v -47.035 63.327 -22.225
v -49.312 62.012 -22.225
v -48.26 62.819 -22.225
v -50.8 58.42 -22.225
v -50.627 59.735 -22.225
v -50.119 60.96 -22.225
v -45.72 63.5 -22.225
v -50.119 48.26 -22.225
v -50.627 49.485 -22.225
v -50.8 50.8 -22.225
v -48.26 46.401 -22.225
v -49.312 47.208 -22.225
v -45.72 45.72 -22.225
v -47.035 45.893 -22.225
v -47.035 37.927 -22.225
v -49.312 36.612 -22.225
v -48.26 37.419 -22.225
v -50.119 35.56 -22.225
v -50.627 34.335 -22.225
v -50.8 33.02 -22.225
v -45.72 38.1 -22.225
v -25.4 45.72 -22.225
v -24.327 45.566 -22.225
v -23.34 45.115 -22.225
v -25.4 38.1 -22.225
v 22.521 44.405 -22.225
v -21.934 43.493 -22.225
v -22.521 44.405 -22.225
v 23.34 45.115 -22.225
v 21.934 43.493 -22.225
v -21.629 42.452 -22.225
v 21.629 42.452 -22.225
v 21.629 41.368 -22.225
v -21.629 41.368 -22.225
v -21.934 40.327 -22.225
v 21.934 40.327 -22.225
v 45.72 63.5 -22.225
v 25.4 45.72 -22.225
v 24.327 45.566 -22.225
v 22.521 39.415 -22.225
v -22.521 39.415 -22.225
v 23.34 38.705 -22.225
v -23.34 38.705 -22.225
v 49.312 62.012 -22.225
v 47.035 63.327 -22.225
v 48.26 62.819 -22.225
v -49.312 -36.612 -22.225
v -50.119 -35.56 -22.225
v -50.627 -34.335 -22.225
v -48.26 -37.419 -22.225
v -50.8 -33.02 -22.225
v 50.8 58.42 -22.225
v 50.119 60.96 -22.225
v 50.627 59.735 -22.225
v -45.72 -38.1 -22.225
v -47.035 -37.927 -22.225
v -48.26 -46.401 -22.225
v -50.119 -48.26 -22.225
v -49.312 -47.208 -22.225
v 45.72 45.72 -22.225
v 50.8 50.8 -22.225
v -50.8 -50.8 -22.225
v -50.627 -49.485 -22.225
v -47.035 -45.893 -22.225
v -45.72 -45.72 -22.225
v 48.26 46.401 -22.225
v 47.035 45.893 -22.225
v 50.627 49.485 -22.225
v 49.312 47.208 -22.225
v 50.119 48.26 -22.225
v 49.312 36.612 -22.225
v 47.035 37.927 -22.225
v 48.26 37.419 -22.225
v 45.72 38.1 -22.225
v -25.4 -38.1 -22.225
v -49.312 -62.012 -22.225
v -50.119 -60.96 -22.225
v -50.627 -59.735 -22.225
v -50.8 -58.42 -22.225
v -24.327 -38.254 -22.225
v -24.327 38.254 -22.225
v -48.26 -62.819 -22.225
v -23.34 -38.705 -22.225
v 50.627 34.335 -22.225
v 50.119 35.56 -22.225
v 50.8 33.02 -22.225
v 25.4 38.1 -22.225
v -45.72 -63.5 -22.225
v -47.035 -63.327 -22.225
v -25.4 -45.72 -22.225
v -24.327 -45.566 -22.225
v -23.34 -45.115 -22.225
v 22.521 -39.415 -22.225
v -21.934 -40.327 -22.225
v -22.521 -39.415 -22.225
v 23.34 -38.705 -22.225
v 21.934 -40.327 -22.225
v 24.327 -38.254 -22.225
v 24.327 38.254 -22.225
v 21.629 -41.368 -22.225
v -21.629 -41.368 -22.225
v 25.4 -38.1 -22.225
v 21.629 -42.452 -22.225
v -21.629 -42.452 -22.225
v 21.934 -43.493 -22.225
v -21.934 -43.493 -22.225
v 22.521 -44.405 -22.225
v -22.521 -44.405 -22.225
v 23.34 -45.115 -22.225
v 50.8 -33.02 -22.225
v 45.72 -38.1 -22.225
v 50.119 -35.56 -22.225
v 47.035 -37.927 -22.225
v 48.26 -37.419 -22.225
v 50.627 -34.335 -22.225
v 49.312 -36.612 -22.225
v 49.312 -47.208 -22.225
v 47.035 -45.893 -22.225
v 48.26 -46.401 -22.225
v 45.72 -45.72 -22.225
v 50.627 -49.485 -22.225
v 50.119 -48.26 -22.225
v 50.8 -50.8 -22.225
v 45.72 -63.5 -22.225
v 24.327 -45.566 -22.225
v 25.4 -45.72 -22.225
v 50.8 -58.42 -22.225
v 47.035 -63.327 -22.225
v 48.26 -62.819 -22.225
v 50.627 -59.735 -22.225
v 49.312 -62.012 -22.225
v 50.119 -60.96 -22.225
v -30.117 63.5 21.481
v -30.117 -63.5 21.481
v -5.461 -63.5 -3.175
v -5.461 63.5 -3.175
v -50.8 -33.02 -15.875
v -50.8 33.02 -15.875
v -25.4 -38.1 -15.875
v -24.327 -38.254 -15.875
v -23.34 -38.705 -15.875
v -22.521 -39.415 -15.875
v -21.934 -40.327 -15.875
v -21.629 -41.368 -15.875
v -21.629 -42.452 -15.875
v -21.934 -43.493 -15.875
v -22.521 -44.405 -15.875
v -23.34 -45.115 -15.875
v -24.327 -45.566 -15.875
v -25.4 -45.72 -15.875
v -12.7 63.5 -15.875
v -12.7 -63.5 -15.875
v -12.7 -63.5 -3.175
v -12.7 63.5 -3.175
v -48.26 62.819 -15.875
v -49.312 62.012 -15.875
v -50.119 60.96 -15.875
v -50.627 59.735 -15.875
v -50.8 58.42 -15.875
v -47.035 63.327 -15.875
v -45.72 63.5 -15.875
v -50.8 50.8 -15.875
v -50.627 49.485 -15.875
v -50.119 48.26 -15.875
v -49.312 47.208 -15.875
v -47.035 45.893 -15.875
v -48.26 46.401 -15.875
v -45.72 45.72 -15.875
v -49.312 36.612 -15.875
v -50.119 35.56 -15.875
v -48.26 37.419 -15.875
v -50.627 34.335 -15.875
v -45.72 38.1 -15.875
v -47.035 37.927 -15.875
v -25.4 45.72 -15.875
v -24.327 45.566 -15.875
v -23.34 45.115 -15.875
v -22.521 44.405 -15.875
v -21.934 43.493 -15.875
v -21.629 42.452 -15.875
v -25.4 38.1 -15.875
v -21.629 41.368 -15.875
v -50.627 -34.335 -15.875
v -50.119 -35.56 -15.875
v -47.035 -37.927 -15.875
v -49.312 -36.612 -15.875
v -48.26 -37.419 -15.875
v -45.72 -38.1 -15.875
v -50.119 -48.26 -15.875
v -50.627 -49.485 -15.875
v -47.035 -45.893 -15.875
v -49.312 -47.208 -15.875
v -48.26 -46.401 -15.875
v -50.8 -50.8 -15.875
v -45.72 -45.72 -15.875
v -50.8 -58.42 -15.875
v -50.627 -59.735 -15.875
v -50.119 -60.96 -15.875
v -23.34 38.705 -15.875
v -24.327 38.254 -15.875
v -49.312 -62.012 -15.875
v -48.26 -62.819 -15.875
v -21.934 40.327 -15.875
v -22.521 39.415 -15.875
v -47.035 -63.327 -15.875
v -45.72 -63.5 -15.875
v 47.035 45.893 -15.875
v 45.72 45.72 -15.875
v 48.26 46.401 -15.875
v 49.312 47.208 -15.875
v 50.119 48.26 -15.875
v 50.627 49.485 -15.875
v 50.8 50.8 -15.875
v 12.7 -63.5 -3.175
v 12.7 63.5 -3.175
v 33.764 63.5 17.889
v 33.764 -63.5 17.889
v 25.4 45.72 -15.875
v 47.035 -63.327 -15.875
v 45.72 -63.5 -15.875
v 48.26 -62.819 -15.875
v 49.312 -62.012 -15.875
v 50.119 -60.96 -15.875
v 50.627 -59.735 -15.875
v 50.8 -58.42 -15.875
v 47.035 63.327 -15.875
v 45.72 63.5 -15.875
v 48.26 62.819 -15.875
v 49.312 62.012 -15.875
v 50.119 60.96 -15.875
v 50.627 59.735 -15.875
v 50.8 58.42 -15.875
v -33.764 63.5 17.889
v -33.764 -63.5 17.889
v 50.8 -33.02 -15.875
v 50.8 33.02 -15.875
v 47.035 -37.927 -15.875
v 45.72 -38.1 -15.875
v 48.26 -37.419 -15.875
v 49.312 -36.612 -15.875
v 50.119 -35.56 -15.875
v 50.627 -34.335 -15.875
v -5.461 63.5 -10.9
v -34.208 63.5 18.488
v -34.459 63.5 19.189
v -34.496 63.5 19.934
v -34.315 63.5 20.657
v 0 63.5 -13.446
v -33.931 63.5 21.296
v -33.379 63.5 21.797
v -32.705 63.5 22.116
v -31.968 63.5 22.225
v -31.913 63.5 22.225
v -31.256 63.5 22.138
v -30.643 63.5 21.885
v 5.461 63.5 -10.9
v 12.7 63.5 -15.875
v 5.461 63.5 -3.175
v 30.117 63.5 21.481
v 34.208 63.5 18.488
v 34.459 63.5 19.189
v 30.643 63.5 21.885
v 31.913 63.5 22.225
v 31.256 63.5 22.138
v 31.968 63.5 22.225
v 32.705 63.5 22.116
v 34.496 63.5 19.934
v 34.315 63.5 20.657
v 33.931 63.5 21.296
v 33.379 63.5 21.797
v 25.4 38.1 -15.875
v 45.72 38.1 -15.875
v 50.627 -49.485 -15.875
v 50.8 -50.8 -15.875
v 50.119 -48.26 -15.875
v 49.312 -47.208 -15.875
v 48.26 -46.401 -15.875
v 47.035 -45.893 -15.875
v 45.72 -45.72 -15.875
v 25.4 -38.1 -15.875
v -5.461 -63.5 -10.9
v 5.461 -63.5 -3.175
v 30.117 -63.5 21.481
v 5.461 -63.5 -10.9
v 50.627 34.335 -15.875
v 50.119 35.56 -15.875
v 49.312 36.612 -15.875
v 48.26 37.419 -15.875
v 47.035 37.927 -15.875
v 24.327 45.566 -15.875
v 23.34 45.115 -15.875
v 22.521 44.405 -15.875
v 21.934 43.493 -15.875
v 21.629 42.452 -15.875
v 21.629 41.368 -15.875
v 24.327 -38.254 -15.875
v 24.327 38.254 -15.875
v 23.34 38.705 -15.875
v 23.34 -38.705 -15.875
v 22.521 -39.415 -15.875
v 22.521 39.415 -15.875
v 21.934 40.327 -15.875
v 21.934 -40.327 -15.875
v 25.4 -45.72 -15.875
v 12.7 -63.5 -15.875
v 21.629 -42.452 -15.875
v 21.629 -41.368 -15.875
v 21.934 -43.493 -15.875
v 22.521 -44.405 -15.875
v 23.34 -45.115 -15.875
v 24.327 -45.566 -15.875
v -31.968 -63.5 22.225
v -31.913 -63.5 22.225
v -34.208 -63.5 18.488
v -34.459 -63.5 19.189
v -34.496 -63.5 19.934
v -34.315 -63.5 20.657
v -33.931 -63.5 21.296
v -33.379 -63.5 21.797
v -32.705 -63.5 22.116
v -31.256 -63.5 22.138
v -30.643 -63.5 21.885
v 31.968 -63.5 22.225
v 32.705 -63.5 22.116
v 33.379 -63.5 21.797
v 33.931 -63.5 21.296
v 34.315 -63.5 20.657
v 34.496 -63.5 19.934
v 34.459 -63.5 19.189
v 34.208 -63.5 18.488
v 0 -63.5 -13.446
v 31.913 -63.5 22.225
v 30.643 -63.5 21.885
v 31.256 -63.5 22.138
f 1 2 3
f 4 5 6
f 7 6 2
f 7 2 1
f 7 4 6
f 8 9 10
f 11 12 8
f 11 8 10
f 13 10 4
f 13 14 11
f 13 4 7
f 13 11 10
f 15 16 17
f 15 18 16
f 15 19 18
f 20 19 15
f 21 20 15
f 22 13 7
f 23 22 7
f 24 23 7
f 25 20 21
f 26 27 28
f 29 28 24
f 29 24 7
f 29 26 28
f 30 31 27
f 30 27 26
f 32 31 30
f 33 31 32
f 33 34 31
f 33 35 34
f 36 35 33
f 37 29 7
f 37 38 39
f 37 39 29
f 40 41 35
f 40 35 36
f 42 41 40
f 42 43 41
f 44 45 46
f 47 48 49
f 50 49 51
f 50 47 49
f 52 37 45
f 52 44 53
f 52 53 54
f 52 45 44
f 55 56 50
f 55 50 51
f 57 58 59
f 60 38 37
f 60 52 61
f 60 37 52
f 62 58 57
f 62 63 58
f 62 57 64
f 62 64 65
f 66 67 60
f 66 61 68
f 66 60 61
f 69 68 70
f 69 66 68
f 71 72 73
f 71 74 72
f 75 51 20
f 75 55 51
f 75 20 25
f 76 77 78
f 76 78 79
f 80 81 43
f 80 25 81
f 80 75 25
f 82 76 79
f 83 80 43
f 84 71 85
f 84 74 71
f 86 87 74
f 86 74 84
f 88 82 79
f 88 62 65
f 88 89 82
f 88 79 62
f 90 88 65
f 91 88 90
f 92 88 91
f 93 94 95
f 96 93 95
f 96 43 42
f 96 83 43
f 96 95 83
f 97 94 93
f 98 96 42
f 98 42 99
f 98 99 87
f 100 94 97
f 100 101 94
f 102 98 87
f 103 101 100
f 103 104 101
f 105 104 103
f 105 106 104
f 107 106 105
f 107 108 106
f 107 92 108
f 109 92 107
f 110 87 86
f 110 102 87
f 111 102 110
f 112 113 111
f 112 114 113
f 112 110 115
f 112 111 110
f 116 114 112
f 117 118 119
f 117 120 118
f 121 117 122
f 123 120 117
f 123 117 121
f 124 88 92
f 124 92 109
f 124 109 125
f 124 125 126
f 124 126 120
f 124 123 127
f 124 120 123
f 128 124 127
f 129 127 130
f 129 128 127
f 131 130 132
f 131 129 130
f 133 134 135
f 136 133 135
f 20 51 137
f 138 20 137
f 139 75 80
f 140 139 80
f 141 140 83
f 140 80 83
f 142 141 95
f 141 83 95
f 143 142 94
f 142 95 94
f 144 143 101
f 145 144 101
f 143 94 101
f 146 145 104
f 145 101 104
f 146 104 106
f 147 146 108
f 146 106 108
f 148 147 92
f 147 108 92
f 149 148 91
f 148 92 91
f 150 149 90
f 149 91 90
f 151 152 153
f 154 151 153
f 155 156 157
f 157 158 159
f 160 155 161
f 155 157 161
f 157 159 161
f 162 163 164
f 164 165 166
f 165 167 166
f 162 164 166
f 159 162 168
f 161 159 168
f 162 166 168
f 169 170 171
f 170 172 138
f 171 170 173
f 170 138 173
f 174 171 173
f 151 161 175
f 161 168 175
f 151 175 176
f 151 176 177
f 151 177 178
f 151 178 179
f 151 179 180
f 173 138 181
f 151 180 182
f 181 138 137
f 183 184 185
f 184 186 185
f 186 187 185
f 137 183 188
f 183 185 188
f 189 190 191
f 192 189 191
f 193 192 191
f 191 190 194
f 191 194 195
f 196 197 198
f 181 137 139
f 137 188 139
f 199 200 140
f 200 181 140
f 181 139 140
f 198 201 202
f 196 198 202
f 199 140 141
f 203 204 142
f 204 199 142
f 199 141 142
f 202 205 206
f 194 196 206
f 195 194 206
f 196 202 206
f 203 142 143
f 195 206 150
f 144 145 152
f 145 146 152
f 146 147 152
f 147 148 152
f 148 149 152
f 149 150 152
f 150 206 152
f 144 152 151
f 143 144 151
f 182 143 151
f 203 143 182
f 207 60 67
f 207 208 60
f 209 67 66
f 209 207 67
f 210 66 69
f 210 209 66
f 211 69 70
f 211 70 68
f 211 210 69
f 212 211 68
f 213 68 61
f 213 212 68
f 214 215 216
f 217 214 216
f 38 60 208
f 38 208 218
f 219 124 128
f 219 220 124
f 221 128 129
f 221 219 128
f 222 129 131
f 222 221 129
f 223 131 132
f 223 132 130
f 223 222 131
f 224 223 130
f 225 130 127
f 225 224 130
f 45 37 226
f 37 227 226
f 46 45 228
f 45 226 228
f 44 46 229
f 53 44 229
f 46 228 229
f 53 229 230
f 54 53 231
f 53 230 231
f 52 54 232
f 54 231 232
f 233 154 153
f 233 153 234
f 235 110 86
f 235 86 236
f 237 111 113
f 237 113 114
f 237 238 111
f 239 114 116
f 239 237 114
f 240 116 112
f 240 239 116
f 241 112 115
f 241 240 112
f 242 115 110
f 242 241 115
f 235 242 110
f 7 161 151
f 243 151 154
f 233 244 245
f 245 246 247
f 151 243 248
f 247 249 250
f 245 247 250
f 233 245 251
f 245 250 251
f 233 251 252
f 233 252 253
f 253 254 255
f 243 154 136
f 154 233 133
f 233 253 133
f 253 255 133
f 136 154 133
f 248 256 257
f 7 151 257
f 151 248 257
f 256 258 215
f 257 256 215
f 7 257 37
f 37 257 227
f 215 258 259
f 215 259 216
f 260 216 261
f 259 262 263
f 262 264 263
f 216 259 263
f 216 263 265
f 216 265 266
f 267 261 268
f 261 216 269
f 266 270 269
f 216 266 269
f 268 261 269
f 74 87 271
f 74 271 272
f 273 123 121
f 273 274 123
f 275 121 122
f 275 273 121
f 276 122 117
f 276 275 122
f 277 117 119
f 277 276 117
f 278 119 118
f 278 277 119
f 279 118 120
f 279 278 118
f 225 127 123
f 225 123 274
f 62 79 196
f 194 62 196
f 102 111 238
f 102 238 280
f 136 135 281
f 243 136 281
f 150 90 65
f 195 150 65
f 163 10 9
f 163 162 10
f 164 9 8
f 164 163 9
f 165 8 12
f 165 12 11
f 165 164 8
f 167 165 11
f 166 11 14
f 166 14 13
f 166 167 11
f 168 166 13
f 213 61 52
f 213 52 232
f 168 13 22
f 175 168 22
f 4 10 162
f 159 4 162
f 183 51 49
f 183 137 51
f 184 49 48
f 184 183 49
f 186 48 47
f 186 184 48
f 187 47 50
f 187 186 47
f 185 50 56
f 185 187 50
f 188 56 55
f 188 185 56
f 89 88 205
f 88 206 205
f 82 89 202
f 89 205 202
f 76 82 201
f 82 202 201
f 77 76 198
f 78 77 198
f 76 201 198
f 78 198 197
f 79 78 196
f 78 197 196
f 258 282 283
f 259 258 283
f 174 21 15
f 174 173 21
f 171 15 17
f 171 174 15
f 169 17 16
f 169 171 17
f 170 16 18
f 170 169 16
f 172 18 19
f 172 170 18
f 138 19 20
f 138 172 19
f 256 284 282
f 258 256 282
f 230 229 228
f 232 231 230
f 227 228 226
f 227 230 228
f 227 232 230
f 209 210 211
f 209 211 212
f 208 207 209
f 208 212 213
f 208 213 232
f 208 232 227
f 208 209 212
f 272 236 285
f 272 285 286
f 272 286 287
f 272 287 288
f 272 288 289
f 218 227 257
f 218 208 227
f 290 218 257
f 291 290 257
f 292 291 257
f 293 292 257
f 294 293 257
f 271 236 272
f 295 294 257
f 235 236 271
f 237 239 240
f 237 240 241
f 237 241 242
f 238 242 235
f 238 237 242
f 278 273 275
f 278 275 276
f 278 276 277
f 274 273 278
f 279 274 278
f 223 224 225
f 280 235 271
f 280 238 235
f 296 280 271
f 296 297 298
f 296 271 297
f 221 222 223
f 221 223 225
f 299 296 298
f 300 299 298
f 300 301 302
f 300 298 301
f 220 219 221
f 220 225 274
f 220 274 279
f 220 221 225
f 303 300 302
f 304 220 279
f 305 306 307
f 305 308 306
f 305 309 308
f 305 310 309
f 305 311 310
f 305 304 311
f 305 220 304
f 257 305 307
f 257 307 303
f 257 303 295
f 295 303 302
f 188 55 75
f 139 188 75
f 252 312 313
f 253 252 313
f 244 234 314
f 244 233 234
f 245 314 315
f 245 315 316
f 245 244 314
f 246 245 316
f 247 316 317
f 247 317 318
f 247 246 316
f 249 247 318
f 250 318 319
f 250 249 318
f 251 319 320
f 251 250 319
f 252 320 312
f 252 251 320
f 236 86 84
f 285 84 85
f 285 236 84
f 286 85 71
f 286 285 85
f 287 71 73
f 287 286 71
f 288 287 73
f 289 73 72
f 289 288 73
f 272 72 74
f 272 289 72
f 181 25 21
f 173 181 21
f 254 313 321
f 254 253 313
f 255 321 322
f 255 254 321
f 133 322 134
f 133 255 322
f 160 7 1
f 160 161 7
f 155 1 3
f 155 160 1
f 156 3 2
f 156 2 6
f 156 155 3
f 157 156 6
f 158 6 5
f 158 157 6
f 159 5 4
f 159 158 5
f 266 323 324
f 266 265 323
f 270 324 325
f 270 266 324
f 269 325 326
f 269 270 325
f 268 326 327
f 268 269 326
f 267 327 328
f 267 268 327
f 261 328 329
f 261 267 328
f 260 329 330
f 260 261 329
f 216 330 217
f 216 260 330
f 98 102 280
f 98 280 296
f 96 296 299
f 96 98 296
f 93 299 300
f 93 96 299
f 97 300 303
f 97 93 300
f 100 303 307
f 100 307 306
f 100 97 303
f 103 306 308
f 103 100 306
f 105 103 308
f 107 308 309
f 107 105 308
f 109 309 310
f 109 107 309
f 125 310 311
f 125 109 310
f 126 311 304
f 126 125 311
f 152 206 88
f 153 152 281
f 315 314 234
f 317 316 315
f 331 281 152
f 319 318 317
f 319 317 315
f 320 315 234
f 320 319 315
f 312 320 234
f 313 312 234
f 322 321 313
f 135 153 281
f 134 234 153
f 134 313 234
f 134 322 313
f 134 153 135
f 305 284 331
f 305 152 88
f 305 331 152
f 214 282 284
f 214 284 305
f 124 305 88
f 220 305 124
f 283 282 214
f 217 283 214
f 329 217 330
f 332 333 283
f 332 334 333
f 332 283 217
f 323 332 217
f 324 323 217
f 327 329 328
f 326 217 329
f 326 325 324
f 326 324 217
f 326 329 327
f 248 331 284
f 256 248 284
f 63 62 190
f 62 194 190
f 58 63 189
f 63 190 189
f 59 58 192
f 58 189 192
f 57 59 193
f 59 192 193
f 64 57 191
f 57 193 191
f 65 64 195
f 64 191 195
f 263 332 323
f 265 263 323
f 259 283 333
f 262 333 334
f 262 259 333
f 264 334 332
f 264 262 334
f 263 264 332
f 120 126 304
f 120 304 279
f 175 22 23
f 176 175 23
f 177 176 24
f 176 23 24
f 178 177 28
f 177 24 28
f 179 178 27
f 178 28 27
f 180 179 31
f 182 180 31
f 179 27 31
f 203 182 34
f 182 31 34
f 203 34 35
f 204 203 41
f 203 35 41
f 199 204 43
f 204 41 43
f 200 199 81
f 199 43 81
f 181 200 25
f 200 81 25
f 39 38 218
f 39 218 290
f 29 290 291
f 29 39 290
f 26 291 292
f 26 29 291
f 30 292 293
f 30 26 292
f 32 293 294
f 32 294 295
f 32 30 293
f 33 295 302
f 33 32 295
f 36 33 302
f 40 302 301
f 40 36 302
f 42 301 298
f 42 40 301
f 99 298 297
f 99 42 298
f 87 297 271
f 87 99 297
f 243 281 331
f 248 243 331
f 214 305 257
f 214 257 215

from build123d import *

# Parameters (mm, degrees)
F0_W     = 101.6
F0_H     = 44.45
F1_DEPTH = 63.5
F3_DEPTH = 127.001
F5_DEPTH = 127.001
F6_R     = 2.54
F8_DEPTH = 6.35
F9_R     = 5.08


# Not quite as in the source:
# - a pattern or mirror of a feature is missing from the dataset's text; its kind, count and spacing are read off the source's solid


with BuildPart() as f1:
    # F0 (on Front) → F1 (new body, symmetric)
    with BuildSketch(Plane.XZ):
        Rectangle(F0_W, F0_H)
    extrude(amount=F1_DEPTH, both=True)

    # F2 (on face) → F3 (cut, through all)
    with BuildSketch(Plane.XZ.offset(63.5)):
        Polygon((-50.8, -15.875), (-12.7, -15.875), (-12.7, -3.175), (-38.1, 22.225), (-50.8, 22.225), align=None)
    f3 = extrude(amount=-F3_DEPTH, mode=Mode.SUBTRACT)

    # F3_copies: F3 across plane
    add(f3.mirror(Plane(origin=(0, 0, 0), x_dir=(0, 0, 1), z_dir=(1, 0, 0))), mode=Mode.SUBTRACT)

    # F4 (on face) → F5 (cut, through all)
    with BuildSketch(Plane.XZ.offset(63.5)):
        Polygon((30.861, 22.225), (-30.861, 22.225), (-5.461, -3.175), (-5.461, -10.8996083293), (0, -13.4461144505), (5.461, -10.8996083293), (5.461, -3.175), align=None)
    extrude(amount=-F5_DEPTH, mode=Mode.SUBTRACT)

    # F6
    f6_edges = [f1.edges().sort_by_distance(p)[0] for p in [
        (-38.1, 0, 22.225),
        (-30.861, 0, 22.225),
        (30.861, 0, 22.225),
        (38.1, 0, 22.225),
    ]]
    fillet(f6_edges, radius=F6_R)

    # F7 (on face) → F8 (cut, through all)
    with BuildSketch(Plane(origin=(0, 0, -22.225), x_dir=(1, 0, 0), z_dir=(0, 0, -1))):
        with BuildLine():
            Line((-25.4, 45.72), (-50.8, 45.72))
            Line((-50.8, 45.72), (-50.8, 38.1))
            Line((-50.8, 38.1), (-25.4, 38.1))
            ThreePointArc((-25.4, 38.1), (-21.59, 41.91), (-25.4, 45.72))
        make_face()
        with BuildLine():
            Line((-25.4, -38.1), (-50.8, -38.1))
            Line((-50.8, -38.1), (-50.8, -45.72))
            Line((-50.8, -45.72), (-25.4, -45.72))
            ThreePointArc((-25.4, -45.72), (-21.59, -41.91), (-25.4, -38.1))
        make_face()
    f8 = extrude(amount=-F8_DEPTH, mode=Mode.SUBTRACT)

    # F8_copies: F8 across plane
    add(f8.mirror(Plane(origin=(0, 0, 0), x_dir=(0, 0, 1), z_dir=(1, 0, 0))), mode=Mode.SUBTRACT)

    # F9
    f9_edges = [f1.edges().sort_by_distance(p)[0] for p in [
        (-50.8, -63.5, -19.05),
        (-50.8, 63.5, -19.05),
        (50.8, -63.5, -19.05),
        (50.8, 63.5, -19.05),
        (-50.8, -45.72, -19.05),
        (-50.8, 38.1, -19.05),
        (-50.8, 45.72, -19.05),
        (-50.8, -38.1, -19.05),
        (50.8, 45.72, -19.05),
        (50.8, -45.72, -19.05),
        (50.8, -38.1, -19.05),
        (50.8, 38.1, -19.05),
    ]]
    fillet(f9_edges, radius=F9_R)


solid = f1.part
